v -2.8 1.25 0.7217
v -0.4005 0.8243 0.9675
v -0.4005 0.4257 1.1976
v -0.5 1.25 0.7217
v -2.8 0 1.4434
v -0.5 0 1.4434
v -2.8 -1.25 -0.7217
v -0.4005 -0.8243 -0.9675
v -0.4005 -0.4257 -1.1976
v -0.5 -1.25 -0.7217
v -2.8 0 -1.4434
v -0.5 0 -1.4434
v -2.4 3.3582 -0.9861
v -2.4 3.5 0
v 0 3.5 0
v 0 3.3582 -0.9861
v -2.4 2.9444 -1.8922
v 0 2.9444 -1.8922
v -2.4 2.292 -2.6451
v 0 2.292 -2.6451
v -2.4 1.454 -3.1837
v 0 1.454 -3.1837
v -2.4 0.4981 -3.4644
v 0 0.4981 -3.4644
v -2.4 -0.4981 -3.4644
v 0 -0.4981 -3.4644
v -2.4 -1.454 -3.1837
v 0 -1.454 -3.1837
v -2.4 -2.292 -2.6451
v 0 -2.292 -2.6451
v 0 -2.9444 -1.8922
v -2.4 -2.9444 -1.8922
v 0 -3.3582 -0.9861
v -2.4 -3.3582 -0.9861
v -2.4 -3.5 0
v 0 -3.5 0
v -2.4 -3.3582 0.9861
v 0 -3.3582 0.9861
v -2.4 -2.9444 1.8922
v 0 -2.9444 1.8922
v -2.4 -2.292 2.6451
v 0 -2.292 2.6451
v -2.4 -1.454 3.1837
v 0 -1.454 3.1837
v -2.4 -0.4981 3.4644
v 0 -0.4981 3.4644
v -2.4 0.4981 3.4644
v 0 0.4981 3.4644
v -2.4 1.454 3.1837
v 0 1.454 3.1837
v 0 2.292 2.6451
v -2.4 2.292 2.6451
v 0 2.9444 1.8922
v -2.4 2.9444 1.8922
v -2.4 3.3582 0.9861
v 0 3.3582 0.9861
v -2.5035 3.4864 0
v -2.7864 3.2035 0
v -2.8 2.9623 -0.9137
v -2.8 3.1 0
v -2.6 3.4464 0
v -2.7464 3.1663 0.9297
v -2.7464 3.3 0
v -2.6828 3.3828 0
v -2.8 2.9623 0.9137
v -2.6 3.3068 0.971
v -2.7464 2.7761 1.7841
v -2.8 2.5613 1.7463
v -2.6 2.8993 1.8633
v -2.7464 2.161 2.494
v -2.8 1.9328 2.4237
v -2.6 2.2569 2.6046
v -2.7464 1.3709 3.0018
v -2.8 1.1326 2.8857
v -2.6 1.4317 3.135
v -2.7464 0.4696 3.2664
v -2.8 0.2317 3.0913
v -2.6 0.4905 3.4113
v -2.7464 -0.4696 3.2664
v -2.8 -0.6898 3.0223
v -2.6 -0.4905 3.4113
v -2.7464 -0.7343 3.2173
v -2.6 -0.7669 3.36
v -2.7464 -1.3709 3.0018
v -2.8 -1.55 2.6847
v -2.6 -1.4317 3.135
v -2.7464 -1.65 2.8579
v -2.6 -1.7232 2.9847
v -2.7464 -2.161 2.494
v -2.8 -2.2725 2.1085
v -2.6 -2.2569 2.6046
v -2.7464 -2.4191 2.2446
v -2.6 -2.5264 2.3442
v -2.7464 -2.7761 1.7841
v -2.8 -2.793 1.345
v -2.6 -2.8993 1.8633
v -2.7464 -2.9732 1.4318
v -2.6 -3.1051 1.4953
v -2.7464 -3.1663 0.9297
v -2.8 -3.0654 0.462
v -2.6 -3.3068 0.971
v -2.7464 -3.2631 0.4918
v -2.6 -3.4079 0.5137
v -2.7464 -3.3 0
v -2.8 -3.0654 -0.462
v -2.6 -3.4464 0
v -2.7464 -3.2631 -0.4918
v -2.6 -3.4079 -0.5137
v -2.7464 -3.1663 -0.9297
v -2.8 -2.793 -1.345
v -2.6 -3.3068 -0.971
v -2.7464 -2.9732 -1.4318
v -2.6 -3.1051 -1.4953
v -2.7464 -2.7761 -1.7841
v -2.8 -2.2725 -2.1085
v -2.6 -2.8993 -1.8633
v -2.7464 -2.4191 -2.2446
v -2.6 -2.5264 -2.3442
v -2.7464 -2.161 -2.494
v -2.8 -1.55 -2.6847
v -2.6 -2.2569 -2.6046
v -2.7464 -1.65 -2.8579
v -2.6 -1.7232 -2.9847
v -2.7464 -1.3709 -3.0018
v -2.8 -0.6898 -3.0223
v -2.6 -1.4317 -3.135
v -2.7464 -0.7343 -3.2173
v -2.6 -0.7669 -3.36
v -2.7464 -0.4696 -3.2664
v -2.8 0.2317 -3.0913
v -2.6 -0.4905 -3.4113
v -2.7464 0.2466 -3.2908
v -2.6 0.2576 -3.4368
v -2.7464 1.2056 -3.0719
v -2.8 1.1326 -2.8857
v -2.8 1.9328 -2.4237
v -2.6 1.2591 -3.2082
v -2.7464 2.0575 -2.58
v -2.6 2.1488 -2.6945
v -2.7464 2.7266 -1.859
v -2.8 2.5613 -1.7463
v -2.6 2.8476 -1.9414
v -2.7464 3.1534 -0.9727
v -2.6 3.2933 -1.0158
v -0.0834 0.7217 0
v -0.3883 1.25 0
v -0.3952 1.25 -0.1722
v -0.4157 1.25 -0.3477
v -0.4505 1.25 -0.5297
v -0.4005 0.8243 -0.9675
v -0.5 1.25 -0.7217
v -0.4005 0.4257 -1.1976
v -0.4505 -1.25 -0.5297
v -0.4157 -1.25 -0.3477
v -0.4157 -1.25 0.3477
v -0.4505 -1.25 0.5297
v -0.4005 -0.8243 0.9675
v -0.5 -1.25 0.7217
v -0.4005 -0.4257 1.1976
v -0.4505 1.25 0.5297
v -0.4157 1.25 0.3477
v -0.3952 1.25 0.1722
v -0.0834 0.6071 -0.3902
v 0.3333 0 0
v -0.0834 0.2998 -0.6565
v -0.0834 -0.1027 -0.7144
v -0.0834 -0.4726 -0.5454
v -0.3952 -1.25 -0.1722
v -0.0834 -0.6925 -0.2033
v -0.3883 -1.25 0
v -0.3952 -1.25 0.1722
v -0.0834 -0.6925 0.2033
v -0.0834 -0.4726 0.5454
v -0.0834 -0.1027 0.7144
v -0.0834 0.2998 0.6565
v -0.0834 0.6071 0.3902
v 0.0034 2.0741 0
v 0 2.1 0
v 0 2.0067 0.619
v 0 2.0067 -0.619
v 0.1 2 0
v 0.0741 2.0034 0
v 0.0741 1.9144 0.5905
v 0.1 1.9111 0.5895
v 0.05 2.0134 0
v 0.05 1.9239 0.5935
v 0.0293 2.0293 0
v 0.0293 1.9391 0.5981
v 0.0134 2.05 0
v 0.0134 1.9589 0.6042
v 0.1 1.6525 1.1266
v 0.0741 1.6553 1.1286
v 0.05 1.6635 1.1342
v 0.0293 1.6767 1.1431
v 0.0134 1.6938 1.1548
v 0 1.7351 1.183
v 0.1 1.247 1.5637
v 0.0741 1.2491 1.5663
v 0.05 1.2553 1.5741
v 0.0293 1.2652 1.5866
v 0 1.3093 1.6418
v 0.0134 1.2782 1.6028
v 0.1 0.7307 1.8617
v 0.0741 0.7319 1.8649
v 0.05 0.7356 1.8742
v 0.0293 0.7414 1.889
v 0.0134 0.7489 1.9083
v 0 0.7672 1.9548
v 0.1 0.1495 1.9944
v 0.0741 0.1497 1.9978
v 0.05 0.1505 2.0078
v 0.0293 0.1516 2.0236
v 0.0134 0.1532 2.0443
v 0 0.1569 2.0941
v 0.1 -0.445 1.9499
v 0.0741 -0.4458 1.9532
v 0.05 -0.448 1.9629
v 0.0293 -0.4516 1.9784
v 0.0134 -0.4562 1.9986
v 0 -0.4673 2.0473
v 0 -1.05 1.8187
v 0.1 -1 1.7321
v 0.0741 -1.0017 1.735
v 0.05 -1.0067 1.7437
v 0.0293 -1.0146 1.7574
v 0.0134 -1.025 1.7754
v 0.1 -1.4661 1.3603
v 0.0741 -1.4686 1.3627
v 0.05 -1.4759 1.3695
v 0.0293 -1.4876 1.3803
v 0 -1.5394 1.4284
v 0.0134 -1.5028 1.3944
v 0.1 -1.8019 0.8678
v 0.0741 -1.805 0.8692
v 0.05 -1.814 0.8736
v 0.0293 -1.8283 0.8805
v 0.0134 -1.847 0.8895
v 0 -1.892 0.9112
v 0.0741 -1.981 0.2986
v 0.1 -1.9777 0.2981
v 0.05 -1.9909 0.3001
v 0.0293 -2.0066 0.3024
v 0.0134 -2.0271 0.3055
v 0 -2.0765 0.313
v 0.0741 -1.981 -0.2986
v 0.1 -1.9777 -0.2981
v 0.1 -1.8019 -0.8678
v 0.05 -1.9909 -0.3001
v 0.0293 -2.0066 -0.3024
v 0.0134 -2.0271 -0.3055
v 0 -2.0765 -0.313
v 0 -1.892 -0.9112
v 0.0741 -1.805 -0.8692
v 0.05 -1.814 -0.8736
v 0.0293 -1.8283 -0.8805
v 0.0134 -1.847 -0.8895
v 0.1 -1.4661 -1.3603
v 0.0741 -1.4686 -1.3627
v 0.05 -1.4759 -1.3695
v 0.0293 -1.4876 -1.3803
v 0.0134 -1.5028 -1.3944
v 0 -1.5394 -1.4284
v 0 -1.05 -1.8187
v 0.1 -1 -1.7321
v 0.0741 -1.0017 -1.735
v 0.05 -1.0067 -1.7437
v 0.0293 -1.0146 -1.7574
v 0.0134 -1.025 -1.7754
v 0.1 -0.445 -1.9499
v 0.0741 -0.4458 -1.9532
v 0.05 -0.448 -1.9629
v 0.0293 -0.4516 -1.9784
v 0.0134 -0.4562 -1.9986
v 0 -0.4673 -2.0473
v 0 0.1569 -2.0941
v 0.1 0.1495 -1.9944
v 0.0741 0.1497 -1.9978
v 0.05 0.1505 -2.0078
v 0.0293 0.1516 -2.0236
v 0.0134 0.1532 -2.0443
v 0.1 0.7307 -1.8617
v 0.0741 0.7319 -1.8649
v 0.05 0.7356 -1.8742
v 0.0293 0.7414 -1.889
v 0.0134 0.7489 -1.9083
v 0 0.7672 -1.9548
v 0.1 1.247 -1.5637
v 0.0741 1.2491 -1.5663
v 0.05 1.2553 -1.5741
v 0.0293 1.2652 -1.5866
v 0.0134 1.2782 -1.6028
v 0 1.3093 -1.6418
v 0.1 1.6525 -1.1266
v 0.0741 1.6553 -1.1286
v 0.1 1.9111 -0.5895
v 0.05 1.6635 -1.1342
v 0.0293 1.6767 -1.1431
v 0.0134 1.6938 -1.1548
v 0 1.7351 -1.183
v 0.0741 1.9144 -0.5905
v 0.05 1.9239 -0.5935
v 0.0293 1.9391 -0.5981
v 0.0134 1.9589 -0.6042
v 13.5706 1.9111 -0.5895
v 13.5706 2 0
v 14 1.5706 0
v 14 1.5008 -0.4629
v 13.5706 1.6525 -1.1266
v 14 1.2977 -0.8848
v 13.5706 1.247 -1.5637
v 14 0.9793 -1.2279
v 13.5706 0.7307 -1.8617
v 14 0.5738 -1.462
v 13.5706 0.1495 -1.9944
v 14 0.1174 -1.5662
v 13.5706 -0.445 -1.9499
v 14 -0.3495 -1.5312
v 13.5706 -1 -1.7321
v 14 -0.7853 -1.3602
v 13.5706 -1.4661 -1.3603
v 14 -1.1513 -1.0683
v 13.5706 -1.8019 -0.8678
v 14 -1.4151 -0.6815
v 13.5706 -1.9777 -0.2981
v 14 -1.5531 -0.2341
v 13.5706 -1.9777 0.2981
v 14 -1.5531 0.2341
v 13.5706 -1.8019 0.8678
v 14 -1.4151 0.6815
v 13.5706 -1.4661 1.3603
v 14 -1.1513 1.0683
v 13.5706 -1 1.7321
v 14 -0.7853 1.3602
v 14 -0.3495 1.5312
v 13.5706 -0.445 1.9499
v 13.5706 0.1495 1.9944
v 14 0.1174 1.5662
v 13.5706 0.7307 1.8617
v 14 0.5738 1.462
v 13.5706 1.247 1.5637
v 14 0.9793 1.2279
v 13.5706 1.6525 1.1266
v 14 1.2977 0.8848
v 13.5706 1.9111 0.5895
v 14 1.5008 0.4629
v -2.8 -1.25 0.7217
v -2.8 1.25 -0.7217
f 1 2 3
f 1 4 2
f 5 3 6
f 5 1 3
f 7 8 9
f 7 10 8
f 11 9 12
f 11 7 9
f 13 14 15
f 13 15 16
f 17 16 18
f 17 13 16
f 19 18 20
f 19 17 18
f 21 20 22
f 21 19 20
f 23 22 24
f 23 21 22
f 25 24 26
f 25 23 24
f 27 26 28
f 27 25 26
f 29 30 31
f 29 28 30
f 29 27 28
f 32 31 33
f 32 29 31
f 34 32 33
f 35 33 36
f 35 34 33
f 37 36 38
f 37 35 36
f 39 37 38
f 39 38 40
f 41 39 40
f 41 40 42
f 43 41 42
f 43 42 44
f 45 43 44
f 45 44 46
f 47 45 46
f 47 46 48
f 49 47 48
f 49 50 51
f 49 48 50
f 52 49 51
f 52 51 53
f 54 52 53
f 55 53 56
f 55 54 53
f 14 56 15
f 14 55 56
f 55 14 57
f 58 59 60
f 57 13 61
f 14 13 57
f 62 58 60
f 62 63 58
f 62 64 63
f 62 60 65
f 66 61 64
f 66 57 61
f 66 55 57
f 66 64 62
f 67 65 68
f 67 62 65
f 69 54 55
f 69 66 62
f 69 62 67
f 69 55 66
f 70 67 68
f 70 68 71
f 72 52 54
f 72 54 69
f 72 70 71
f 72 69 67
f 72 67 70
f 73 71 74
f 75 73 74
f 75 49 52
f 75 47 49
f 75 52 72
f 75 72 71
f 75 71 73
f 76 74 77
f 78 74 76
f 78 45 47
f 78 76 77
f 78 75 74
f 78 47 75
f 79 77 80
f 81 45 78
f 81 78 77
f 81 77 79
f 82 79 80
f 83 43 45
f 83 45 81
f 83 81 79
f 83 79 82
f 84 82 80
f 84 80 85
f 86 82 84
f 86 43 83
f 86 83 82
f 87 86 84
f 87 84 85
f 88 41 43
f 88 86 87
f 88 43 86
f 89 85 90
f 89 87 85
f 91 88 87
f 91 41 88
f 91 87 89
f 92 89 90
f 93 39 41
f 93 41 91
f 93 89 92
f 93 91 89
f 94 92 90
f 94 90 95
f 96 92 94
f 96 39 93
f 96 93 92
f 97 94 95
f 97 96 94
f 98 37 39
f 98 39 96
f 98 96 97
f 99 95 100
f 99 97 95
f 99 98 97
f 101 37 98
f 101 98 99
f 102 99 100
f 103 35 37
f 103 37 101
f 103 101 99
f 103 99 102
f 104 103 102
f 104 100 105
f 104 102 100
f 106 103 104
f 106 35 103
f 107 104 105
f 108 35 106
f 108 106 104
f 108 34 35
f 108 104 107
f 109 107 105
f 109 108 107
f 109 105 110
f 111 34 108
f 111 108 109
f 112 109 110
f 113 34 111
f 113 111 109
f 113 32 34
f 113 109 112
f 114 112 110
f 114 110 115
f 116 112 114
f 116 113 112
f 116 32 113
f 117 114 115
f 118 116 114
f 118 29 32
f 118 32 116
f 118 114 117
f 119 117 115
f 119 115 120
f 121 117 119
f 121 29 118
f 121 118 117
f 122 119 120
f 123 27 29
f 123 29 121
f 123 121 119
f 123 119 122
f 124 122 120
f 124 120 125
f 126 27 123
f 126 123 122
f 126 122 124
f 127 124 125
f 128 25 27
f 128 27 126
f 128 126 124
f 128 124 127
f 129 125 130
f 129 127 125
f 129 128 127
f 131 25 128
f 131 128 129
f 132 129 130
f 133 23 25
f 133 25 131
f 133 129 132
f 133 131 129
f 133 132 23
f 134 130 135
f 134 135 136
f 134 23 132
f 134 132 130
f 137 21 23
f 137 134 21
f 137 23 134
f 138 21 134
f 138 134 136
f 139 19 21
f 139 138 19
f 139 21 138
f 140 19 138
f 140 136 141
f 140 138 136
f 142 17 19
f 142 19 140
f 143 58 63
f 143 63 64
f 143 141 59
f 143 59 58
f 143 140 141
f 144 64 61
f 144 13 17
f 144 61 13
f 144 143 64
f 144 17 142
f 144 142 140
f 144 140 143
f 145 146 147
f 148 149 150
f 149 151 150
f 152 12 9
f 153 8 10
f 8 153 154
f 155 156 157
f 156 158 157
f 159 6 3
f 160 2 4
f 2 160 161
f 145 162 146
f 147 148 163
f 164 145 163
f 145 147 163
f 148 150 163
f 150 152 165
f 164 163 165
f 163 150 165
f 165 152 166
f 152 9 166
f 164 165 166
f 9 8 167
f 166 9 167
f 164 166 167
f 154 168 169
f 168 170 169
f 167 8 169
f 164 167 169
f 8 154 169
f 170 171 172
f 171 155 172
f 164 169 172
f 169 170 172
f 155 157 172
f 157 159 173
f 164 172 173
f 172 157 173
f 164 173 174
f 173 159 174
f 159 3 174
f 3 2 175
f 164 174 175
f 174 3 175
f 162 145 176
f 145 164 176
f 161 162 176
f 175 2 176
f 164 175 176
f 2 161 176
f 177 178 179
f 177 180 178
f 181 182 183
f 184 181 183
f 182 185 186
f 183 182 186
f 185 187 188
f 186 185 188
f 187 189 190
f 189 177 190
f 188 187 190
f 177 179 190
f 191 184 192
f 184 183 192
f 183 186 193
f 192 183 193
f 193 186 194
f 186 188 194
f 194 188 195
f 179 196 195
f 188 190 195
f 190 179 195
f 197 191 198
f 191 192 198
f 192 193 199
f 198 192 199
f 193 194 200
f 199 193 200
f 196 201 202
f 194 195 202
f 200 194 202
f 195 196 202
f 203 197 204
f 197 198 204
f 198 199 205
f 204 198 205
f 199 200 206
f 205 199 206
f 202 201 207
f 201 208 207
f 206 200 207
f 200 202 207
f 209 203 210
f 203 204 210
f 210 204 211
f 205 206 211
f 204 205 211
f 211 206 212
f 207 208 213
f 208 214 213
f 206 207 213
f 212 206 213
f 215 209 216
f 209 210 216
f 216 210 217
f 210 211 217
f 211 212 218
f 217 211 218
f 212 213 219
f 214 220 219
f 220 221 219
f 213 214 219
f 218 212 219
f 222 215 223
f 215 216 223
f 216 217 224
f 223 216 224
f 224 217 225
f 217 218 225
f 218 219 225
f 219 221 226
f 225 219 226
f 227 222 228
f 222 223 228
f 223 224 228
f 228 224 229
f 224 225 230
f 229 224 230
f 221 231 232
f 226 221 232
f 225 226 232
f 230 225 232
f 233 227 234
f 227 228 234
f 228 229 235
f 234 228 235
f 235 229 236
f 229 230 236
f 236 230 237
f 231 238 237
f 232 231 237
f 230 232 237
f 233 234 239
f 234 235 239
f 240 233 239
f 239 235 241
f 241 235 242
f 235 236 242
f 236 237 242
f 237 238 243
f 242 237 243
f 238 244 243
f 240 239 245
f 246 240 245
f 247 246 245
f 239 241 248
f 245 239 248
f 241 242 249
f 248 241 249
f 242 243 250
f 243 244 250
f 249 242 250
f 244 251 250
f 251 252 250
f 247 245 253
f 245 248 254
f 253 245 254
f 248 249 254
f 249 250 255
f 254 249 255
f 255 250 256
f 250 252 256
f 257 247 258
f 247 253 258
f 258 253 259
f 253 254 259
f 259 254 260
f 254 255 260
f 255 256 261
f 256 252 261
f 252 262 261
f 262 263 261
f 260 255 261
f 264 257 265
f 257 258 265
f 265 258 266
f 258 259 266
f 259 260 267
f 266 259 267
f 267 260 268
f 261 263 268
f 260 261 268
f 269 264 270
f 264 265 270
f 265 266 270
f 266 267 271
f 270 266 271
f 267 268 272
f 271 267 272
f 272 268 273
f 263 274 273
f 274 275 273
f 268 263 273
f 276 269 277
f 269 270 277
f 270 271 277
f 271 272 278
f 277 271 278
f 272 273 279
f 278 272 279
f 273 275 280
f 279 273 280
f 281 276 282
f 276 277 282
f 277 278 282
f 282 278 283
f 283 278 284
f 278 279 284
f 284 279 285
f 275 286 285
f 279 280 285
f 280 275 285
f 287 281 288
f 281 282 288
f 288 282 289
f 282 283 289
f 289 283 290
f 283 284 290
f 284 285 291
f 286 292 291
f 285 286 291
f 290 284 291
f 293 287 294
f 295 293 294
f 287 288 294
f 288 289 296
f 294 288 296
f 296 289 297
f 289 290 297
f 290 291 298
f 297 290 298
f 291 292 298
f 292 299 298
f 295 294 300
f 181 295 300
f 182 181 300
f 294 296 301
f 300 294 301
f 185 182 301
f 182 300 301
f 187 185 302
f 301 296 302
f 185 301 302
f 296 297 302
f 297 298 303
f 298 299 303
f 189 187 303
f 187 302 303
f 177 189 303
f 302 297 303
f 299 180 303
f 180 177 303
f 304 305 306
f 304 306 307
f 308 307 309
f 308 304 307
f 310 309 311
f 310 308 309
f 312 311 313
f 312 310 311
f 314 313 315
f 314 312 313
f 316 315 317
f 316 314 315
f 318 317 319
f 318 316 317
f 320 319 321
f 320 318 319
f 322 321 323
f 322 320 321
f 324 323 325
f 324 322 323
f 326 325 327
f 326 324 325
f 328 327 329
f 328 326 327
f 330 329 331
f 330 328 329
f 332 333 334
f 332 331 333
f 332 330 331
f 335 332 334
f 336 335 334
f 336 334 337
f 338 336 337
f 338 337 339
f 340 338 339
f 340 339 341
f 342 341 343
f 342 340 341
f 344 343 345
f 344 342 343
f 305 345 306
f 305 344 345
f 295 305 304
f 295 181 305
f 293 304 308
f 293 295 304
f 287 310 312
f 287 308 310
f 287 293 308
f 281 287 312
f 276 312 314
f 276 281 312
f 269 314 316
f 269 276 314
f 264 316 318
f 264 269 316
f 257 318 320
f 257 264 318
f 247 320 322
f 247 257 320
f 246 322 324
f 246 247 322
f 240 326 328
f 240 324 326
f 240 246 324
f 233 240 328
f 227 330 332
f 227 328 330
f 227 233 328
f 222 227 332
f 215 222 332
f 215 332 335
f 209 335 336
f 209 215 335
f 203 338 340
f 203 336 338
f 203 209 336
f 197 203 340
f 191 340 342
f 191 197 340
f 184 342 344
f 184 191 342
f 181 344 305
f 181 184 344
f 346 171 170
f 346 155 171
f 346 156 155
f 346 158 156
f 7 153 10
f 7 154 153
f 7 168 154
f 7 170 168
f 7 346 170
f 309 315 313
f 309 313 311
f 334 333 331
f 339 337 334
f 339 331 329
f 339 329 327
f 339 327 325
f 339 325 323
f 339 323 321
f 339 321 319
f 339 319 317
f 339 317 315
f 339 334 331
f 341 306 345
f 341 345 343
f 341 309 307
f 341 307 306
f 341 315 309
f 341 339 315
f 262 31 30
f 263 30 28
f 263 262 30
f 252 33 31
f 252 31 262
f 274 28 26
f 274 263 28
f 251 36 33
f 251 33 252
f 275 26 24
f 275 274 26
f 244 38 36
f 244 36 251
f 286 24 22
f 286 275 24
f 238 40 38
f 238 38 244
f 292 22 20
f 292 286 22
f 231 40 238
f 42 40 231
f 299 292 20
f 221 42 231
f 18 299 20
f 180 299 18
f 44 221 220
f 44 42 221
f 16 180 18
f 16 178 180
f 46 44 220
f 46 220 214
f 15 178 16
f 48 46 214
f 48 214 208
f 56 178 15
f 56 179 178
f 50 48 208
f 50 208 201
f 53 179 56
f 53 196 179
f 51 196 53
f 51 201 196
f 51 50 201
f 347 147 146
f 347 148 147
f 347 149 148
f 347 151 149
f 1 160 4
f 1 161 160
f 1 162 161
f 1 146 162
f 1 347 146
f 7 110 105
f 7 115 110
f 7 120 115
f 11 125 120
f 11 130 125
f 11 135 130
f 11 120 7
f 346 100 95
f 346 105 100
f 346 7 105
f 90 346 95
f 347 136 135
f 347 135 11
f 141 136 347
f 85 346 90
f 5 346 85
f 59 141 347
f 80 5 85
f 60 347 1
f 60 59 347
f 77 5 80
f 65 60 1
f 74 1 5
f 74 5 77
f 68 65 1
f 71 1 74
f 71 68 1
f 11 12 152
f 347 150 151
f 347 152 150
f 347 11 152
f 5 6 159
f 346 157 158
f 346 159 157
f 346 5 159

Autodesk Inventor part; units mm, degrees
ref_plane "YZ Plane" through (0, 0, 0) normal (1, 0, 0) x (0, 1, 0)
ref_plane "XZ Plane" through (0, 0, 0) normal (0, 1, 0) x (-1, 0, 0)
sketch "Szkic1" plane through (0, 0, 0) normal (0, 0, 1) x (1, 0, 0)
  line L0 (0.3333, 0) -> (14, 0)
  line L1 (14, 0) -> (14, 2)
  line L2 (14, 2) -> (2.1, 2)
  line L3 (2.1, 2) -> (1.6705, 2)
  line L4 (1.6705, 2) -> (0, 2)
  line L5 (0, 2) -> (0, 3.5)
  line L6 (0, 3.5) -> (-2.8, 3.5)
  line L7 (-2.8, 3.5) -> (-2.8, 1.4434)
  line L8 (-2.8, 1.4434) -> (-0.5, 1.4434)
  line L9 (-0.5, 1.4434) -> (0.3333, 0)
  line L10 (-6.16, 0) -> (17.36, 0) projected
  line L11 (0, -0.7) -> (0, 4.2) projected
  line L12 (2.1, 2) -> (0, 2) construction
  dimension "d1" = 11.9
  dimension "d2" = 0.4295
  dimension "d3" = 2.8
  dimension "d4" = 2.3
  dimension "d5" = 60
  dimension "d6" = 4
  dimension "d7" = 4
  dimension "d8" = 2.8868
  dimension "d9" = 7
  dimension "d26" = 14
revolve "Bryła" add sketch "Szkic1" angle 360 about axis through (0.3333, 0, 0) along (1, 0, 0) contours L9 L11 L4 L3 L2 L1 L0 | L9 L8 L7 L6 L5 L11
sketch "Szkic2" plane through (-2.8, 0, 0) normal (-1, 0, 0) x (0, 0, 1)
  circle A0 centre (0, 0) radius 1.4434 projected
  line L0 (0, -4.9) -> (0, 4.9) projected
  line L1 (-4.9, 0) -> (4.9, 0) projected
  line L2 (1.4434, 0) -> (0.7217, -1.25)
  line L3 (0.7217, -1.25) -> (-0.7217, -1.25)
  line L4 (-0.7217, -1.25) -> (-1.4434, 0)
  line L5 (-1.4434, 0) -> (-0.7217, 1.25)
  line L6 (-0.7217, 1.25) -> (0.7217, 1.25)
  line L7 (0.7217, 1.25) -> (1.4434, 0)
  point P0 (0, 0)
extrude "Szczelina" add sketch "Szkic2" against normal up to next contours L7 A0 | A0 L2 | L6 L0 A0 | A0 L0 L3 | L0 L6 A0 | A0 L3 L0 | L4 A0 | A0 L5
fillet "Zaokrąglenie1" radius 0.4 1 edges at (-2.8, -3.5, 0)
thread "Gwint" size "M4x0.7" class "6g" standard "ISO Metric profile" length 11.9
chamfer "Faza1" distance 0.4294 distance2 0.4294 1 edges at (14, -2, 0) measured on face at (14, 0.527, -0.2661)
ref_plane "Work Plane1" through (29, 0, 0) normal (0, -1, 0) x (1, 0, 0)
fillet "Fillet2" radius 0.1 1 edges at (0, -2, 0)
equation "\"d1\" = GEL"
equation "\"d3\" = KOH"
equation "\"d4\" = INTI"
equation "\"d6\" = GD"
equation "\"d7\" = BDM"
equation "\"d8\" = 1.1547 * SW"
equation "\"d9\" = KOD"
equation "\"d26\" = NLG"
equation "\"d30\" = R"
equation "\"d17\" = RR"
equation "\"d13\" = GEL"
equation "\"d15\" = -0.5 * SPD + 0.5 * GD"
equation "\"d16\" = GUL"
equation "\"GD\" = NND"
equation "\"NLG\" = 14"
equation "\"GEL\" = 11.9"
equation "\"KOD\" = 7"
equation "\"KOH\" = 2.8"
equation "\"INTI\" = 2.3"
equation "\"GAL\" = 0.61345 * PTC"
equation "\"GUL\" = 0.61345 * PTC"
equation "\"BDM\" = NND"
equation "\"SW\" = 2.5"
equation "\"RR\" = 0.4"
equation "\"SPD\" = NND - 1.2269 * PTC"
equation "\"R\" = 0.1"
equation "\"TOA\" = 30deg"
equation "\"GD1\" = THREADDIA - 1.2269 * PTC"
equation "\"THREADDIA\" = 4"
equation "\"FAWI\" = 45deg"
equation "\"ANG\" = 120deg"
equation "\"PTC\" = 0.7"
equation "\"NND\" = 4"
equation "\"E0\" = 1.155 * SW"
properties part number "DIN 7984 - M4 x 14" material "Stal, miękka"
